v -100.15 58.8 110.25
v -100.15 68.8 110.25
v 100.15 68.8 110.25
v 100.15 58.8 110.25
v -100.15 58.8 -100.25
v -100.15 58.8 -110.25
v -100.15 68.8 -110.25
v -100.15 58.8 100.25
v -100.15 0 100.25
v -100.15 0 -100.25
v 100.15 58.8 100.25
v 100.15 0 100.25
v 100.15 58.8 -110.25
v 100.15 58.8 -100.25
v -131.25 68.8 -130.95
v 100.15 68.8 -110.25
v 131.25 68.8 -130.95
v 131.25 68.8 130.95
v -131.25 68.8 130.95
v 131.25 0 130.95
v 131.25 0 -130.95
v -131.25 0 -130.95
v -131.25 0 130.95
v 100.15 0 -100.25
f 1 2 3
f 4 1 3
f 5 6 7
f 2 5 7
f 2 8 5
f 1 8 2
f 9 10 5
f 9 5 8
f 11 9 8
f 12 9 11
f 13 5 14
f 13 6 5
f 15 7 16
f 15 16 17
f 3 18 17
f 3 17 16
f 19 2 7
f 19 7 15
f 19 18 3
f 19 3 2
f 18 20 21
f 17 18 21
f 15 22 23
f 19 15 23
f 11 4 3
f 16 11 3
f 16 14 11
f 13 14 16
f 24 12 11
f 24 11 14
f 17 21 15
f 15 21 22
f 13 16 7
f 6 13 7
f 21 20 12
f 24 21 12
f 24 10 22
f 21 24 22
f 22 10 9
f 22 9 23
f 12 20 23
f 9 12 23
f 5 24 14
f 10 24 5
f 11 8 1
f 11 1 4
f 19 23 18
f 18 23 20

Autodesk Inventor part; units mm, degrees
ref_plane "YZ Plane" through (0, 0, 0) normal (1, 0, 0) x (0, 1, 0)
ref_plane "XZ Plane" through (0, 0, 0) normal (0, 1, 0) x (-1, 0, 0)
ref_plane "XY Plane" through (0, 0, 0) normal (0, 0, 1) x (1, 0, 0)
sketch "Esboço1" plane through (0, 0, 0) normal (0, 1, 0) x (-1, 0, 0)
  line L0 (131.25, 130.95) -> (-131.25, 130.95)
  line L1 (-131.25, 130.95) -> (-131.25, -130.95)
  line L2 (-131.25, -130.95) -> (131.25, -130.95)
  line L3 (131.25, -130.95) -> (131.25, 130.95)
  line L4 (131.25, 130.95) -> (-131.25, -130.95) construction
  line L5 (-131.25, 130.95) -> (131.25, -130.95) construction
  line L6 (-131.25, -110.25) -> (131.25, -110.25)
  line L7 (131.25, 110.25) -> (-131.25, 110.25)
  line L8 (100.15, -130.95) -> (100.15, 130.95)
  line L9 (-100.15, 130.95) -> (-100.15, -130.95)
  line L10 (131.25, 100.25) -> (-131.25, 100.25)
  line L11 (-131.25, -100.25) -> (131.25, -100.25)
  point P0 (0, 0)
  point P1 (-100.15, -100.25)
  point P2 (100.15, -100.25)
  point P3 (100.15, 100.25)
  point P4 (-100.15, 100.25)
  dimension "d0" = 262.5
  dimension "d1" = 261.9
  dimension "d2" = 20.7
  dimension "d3" = 20.7
  dimension "d4" = 31.1
  dimension "d5" = 31.1
  dimension "d6" = 10
  dimension "d7" = 10
extrude "Extrusão1" add sketch "Esboço1" along normal blind 68.8
extrude "Extrusão2" cut sketch "Esboço1" along normal blind 68.8 contours L8 L11 L9 L10
sketch "Esboço2" plane through (0, 68.8, 0) normal (0, 1, 0) x (1, 0, 0)
  line L0 (100.15, 100.25) -> (-100.15, 100.25) projected
  line L1 (-100.15, -100.25) -> (-100.15, 100.25) projected
  line L2 (-100.15, 100.25) -> (-100.15, -100.25) projected
  line L3 (-100.15, 100.25) -> (-100.15, -100.25) projected
  line L4 (-100.15, -100.25) -> (-100.15, 100.25) projected
  line L5 (-131.25, 130.95) -> (-131.25, -130.95) projected
  line L6 (-131.25, 130.95) -> (-131.25, -130.95) projected
  line L7 (-131.25, 130.95) -> (-131.25, -130.95) projected
  line L8 (-131.25, 130.95) -> (-131.25, -130.95) projected
  line L9 (131.25, 130.95) -> (-131.25, 130.95) projected
  line L10 (-100.15, -100.25) -> (100.15, -100.25) projected
  line L11 (-131.25, -130.95) -> (131.25, -130.95) projected
  line L12 (100.15, 100.25) -> (-100.15, 100.25) projected
  line L13 (-100.15, 100.25) -> (-100.15, -100.25) projected
  line L14 (-100.15, -100.25) -> (100.15, -100.25) projected
  line L15 (100.15, -100.25) -> (100.15, 100.25) projected
  line L16 (-131.25, -130.95) -> (131.25, -130.95) projected
  line L17 (-131.25, 130.95) -> (-131.25, -130.95) projected
  line L18 (131.25, 130.95) -> (-131.25, 130.95) projected
  line L19 (131.25, -130.95) -> (131.25, 130.95) projected
  line L20 (131.25, -130.95) -> (131.25, 130.95) projected
  line L21 (100.15, -100.25) -> (100.15, 100.25) projected
  line L22 (-131.25, -130.95) -> (131.25, -130.95) projected
  line L23 (-131.25, -110.25) -> (131.25, -110.25) projected
  line L24 (-131.25, -100.25) -> (131.25, -100.25) projected
  line L25 (131.25, -130.95) -> (131.25, 130.95) projected
  line L26 (100.15, -130.95) -> (100.15, 130.95) projected
  line L27 (-100.15, 130.95) -> (-100.15, -130.95) projected
  line L28 (-131.25, -130.95) -> (131.25, 130.95) construction
  line L29 (-131.25, 130.95) -> (-131.25, -130.95) projected
  line L30 (131.25, -130.95) -> (-131.25, 130.95) construction
  line L31 (131.25, 100.25) -> (-131.25, 100.25) projected
  line L32 (131.25, 110.25) -> (-131.25, 110.25) projected
  line L33 (131.25, 130.95) -> (-131.25, 130.95) projected
  point P0 (0, 0)
  point P1 (0, 0)
  point P2 (-100.15, -110.25)
  point P3 (100.15, -110.25)
  point P4 (100.15, 110.25)
  point P5 (-100.15, 110.25)
extrude "Extrusão3" cut sketch "Esboço2" against normal blind 10 contours L0 L27 L32 L26 | L26 L23 L27 L10
properties part number "Melgueira-Sobreninho"
